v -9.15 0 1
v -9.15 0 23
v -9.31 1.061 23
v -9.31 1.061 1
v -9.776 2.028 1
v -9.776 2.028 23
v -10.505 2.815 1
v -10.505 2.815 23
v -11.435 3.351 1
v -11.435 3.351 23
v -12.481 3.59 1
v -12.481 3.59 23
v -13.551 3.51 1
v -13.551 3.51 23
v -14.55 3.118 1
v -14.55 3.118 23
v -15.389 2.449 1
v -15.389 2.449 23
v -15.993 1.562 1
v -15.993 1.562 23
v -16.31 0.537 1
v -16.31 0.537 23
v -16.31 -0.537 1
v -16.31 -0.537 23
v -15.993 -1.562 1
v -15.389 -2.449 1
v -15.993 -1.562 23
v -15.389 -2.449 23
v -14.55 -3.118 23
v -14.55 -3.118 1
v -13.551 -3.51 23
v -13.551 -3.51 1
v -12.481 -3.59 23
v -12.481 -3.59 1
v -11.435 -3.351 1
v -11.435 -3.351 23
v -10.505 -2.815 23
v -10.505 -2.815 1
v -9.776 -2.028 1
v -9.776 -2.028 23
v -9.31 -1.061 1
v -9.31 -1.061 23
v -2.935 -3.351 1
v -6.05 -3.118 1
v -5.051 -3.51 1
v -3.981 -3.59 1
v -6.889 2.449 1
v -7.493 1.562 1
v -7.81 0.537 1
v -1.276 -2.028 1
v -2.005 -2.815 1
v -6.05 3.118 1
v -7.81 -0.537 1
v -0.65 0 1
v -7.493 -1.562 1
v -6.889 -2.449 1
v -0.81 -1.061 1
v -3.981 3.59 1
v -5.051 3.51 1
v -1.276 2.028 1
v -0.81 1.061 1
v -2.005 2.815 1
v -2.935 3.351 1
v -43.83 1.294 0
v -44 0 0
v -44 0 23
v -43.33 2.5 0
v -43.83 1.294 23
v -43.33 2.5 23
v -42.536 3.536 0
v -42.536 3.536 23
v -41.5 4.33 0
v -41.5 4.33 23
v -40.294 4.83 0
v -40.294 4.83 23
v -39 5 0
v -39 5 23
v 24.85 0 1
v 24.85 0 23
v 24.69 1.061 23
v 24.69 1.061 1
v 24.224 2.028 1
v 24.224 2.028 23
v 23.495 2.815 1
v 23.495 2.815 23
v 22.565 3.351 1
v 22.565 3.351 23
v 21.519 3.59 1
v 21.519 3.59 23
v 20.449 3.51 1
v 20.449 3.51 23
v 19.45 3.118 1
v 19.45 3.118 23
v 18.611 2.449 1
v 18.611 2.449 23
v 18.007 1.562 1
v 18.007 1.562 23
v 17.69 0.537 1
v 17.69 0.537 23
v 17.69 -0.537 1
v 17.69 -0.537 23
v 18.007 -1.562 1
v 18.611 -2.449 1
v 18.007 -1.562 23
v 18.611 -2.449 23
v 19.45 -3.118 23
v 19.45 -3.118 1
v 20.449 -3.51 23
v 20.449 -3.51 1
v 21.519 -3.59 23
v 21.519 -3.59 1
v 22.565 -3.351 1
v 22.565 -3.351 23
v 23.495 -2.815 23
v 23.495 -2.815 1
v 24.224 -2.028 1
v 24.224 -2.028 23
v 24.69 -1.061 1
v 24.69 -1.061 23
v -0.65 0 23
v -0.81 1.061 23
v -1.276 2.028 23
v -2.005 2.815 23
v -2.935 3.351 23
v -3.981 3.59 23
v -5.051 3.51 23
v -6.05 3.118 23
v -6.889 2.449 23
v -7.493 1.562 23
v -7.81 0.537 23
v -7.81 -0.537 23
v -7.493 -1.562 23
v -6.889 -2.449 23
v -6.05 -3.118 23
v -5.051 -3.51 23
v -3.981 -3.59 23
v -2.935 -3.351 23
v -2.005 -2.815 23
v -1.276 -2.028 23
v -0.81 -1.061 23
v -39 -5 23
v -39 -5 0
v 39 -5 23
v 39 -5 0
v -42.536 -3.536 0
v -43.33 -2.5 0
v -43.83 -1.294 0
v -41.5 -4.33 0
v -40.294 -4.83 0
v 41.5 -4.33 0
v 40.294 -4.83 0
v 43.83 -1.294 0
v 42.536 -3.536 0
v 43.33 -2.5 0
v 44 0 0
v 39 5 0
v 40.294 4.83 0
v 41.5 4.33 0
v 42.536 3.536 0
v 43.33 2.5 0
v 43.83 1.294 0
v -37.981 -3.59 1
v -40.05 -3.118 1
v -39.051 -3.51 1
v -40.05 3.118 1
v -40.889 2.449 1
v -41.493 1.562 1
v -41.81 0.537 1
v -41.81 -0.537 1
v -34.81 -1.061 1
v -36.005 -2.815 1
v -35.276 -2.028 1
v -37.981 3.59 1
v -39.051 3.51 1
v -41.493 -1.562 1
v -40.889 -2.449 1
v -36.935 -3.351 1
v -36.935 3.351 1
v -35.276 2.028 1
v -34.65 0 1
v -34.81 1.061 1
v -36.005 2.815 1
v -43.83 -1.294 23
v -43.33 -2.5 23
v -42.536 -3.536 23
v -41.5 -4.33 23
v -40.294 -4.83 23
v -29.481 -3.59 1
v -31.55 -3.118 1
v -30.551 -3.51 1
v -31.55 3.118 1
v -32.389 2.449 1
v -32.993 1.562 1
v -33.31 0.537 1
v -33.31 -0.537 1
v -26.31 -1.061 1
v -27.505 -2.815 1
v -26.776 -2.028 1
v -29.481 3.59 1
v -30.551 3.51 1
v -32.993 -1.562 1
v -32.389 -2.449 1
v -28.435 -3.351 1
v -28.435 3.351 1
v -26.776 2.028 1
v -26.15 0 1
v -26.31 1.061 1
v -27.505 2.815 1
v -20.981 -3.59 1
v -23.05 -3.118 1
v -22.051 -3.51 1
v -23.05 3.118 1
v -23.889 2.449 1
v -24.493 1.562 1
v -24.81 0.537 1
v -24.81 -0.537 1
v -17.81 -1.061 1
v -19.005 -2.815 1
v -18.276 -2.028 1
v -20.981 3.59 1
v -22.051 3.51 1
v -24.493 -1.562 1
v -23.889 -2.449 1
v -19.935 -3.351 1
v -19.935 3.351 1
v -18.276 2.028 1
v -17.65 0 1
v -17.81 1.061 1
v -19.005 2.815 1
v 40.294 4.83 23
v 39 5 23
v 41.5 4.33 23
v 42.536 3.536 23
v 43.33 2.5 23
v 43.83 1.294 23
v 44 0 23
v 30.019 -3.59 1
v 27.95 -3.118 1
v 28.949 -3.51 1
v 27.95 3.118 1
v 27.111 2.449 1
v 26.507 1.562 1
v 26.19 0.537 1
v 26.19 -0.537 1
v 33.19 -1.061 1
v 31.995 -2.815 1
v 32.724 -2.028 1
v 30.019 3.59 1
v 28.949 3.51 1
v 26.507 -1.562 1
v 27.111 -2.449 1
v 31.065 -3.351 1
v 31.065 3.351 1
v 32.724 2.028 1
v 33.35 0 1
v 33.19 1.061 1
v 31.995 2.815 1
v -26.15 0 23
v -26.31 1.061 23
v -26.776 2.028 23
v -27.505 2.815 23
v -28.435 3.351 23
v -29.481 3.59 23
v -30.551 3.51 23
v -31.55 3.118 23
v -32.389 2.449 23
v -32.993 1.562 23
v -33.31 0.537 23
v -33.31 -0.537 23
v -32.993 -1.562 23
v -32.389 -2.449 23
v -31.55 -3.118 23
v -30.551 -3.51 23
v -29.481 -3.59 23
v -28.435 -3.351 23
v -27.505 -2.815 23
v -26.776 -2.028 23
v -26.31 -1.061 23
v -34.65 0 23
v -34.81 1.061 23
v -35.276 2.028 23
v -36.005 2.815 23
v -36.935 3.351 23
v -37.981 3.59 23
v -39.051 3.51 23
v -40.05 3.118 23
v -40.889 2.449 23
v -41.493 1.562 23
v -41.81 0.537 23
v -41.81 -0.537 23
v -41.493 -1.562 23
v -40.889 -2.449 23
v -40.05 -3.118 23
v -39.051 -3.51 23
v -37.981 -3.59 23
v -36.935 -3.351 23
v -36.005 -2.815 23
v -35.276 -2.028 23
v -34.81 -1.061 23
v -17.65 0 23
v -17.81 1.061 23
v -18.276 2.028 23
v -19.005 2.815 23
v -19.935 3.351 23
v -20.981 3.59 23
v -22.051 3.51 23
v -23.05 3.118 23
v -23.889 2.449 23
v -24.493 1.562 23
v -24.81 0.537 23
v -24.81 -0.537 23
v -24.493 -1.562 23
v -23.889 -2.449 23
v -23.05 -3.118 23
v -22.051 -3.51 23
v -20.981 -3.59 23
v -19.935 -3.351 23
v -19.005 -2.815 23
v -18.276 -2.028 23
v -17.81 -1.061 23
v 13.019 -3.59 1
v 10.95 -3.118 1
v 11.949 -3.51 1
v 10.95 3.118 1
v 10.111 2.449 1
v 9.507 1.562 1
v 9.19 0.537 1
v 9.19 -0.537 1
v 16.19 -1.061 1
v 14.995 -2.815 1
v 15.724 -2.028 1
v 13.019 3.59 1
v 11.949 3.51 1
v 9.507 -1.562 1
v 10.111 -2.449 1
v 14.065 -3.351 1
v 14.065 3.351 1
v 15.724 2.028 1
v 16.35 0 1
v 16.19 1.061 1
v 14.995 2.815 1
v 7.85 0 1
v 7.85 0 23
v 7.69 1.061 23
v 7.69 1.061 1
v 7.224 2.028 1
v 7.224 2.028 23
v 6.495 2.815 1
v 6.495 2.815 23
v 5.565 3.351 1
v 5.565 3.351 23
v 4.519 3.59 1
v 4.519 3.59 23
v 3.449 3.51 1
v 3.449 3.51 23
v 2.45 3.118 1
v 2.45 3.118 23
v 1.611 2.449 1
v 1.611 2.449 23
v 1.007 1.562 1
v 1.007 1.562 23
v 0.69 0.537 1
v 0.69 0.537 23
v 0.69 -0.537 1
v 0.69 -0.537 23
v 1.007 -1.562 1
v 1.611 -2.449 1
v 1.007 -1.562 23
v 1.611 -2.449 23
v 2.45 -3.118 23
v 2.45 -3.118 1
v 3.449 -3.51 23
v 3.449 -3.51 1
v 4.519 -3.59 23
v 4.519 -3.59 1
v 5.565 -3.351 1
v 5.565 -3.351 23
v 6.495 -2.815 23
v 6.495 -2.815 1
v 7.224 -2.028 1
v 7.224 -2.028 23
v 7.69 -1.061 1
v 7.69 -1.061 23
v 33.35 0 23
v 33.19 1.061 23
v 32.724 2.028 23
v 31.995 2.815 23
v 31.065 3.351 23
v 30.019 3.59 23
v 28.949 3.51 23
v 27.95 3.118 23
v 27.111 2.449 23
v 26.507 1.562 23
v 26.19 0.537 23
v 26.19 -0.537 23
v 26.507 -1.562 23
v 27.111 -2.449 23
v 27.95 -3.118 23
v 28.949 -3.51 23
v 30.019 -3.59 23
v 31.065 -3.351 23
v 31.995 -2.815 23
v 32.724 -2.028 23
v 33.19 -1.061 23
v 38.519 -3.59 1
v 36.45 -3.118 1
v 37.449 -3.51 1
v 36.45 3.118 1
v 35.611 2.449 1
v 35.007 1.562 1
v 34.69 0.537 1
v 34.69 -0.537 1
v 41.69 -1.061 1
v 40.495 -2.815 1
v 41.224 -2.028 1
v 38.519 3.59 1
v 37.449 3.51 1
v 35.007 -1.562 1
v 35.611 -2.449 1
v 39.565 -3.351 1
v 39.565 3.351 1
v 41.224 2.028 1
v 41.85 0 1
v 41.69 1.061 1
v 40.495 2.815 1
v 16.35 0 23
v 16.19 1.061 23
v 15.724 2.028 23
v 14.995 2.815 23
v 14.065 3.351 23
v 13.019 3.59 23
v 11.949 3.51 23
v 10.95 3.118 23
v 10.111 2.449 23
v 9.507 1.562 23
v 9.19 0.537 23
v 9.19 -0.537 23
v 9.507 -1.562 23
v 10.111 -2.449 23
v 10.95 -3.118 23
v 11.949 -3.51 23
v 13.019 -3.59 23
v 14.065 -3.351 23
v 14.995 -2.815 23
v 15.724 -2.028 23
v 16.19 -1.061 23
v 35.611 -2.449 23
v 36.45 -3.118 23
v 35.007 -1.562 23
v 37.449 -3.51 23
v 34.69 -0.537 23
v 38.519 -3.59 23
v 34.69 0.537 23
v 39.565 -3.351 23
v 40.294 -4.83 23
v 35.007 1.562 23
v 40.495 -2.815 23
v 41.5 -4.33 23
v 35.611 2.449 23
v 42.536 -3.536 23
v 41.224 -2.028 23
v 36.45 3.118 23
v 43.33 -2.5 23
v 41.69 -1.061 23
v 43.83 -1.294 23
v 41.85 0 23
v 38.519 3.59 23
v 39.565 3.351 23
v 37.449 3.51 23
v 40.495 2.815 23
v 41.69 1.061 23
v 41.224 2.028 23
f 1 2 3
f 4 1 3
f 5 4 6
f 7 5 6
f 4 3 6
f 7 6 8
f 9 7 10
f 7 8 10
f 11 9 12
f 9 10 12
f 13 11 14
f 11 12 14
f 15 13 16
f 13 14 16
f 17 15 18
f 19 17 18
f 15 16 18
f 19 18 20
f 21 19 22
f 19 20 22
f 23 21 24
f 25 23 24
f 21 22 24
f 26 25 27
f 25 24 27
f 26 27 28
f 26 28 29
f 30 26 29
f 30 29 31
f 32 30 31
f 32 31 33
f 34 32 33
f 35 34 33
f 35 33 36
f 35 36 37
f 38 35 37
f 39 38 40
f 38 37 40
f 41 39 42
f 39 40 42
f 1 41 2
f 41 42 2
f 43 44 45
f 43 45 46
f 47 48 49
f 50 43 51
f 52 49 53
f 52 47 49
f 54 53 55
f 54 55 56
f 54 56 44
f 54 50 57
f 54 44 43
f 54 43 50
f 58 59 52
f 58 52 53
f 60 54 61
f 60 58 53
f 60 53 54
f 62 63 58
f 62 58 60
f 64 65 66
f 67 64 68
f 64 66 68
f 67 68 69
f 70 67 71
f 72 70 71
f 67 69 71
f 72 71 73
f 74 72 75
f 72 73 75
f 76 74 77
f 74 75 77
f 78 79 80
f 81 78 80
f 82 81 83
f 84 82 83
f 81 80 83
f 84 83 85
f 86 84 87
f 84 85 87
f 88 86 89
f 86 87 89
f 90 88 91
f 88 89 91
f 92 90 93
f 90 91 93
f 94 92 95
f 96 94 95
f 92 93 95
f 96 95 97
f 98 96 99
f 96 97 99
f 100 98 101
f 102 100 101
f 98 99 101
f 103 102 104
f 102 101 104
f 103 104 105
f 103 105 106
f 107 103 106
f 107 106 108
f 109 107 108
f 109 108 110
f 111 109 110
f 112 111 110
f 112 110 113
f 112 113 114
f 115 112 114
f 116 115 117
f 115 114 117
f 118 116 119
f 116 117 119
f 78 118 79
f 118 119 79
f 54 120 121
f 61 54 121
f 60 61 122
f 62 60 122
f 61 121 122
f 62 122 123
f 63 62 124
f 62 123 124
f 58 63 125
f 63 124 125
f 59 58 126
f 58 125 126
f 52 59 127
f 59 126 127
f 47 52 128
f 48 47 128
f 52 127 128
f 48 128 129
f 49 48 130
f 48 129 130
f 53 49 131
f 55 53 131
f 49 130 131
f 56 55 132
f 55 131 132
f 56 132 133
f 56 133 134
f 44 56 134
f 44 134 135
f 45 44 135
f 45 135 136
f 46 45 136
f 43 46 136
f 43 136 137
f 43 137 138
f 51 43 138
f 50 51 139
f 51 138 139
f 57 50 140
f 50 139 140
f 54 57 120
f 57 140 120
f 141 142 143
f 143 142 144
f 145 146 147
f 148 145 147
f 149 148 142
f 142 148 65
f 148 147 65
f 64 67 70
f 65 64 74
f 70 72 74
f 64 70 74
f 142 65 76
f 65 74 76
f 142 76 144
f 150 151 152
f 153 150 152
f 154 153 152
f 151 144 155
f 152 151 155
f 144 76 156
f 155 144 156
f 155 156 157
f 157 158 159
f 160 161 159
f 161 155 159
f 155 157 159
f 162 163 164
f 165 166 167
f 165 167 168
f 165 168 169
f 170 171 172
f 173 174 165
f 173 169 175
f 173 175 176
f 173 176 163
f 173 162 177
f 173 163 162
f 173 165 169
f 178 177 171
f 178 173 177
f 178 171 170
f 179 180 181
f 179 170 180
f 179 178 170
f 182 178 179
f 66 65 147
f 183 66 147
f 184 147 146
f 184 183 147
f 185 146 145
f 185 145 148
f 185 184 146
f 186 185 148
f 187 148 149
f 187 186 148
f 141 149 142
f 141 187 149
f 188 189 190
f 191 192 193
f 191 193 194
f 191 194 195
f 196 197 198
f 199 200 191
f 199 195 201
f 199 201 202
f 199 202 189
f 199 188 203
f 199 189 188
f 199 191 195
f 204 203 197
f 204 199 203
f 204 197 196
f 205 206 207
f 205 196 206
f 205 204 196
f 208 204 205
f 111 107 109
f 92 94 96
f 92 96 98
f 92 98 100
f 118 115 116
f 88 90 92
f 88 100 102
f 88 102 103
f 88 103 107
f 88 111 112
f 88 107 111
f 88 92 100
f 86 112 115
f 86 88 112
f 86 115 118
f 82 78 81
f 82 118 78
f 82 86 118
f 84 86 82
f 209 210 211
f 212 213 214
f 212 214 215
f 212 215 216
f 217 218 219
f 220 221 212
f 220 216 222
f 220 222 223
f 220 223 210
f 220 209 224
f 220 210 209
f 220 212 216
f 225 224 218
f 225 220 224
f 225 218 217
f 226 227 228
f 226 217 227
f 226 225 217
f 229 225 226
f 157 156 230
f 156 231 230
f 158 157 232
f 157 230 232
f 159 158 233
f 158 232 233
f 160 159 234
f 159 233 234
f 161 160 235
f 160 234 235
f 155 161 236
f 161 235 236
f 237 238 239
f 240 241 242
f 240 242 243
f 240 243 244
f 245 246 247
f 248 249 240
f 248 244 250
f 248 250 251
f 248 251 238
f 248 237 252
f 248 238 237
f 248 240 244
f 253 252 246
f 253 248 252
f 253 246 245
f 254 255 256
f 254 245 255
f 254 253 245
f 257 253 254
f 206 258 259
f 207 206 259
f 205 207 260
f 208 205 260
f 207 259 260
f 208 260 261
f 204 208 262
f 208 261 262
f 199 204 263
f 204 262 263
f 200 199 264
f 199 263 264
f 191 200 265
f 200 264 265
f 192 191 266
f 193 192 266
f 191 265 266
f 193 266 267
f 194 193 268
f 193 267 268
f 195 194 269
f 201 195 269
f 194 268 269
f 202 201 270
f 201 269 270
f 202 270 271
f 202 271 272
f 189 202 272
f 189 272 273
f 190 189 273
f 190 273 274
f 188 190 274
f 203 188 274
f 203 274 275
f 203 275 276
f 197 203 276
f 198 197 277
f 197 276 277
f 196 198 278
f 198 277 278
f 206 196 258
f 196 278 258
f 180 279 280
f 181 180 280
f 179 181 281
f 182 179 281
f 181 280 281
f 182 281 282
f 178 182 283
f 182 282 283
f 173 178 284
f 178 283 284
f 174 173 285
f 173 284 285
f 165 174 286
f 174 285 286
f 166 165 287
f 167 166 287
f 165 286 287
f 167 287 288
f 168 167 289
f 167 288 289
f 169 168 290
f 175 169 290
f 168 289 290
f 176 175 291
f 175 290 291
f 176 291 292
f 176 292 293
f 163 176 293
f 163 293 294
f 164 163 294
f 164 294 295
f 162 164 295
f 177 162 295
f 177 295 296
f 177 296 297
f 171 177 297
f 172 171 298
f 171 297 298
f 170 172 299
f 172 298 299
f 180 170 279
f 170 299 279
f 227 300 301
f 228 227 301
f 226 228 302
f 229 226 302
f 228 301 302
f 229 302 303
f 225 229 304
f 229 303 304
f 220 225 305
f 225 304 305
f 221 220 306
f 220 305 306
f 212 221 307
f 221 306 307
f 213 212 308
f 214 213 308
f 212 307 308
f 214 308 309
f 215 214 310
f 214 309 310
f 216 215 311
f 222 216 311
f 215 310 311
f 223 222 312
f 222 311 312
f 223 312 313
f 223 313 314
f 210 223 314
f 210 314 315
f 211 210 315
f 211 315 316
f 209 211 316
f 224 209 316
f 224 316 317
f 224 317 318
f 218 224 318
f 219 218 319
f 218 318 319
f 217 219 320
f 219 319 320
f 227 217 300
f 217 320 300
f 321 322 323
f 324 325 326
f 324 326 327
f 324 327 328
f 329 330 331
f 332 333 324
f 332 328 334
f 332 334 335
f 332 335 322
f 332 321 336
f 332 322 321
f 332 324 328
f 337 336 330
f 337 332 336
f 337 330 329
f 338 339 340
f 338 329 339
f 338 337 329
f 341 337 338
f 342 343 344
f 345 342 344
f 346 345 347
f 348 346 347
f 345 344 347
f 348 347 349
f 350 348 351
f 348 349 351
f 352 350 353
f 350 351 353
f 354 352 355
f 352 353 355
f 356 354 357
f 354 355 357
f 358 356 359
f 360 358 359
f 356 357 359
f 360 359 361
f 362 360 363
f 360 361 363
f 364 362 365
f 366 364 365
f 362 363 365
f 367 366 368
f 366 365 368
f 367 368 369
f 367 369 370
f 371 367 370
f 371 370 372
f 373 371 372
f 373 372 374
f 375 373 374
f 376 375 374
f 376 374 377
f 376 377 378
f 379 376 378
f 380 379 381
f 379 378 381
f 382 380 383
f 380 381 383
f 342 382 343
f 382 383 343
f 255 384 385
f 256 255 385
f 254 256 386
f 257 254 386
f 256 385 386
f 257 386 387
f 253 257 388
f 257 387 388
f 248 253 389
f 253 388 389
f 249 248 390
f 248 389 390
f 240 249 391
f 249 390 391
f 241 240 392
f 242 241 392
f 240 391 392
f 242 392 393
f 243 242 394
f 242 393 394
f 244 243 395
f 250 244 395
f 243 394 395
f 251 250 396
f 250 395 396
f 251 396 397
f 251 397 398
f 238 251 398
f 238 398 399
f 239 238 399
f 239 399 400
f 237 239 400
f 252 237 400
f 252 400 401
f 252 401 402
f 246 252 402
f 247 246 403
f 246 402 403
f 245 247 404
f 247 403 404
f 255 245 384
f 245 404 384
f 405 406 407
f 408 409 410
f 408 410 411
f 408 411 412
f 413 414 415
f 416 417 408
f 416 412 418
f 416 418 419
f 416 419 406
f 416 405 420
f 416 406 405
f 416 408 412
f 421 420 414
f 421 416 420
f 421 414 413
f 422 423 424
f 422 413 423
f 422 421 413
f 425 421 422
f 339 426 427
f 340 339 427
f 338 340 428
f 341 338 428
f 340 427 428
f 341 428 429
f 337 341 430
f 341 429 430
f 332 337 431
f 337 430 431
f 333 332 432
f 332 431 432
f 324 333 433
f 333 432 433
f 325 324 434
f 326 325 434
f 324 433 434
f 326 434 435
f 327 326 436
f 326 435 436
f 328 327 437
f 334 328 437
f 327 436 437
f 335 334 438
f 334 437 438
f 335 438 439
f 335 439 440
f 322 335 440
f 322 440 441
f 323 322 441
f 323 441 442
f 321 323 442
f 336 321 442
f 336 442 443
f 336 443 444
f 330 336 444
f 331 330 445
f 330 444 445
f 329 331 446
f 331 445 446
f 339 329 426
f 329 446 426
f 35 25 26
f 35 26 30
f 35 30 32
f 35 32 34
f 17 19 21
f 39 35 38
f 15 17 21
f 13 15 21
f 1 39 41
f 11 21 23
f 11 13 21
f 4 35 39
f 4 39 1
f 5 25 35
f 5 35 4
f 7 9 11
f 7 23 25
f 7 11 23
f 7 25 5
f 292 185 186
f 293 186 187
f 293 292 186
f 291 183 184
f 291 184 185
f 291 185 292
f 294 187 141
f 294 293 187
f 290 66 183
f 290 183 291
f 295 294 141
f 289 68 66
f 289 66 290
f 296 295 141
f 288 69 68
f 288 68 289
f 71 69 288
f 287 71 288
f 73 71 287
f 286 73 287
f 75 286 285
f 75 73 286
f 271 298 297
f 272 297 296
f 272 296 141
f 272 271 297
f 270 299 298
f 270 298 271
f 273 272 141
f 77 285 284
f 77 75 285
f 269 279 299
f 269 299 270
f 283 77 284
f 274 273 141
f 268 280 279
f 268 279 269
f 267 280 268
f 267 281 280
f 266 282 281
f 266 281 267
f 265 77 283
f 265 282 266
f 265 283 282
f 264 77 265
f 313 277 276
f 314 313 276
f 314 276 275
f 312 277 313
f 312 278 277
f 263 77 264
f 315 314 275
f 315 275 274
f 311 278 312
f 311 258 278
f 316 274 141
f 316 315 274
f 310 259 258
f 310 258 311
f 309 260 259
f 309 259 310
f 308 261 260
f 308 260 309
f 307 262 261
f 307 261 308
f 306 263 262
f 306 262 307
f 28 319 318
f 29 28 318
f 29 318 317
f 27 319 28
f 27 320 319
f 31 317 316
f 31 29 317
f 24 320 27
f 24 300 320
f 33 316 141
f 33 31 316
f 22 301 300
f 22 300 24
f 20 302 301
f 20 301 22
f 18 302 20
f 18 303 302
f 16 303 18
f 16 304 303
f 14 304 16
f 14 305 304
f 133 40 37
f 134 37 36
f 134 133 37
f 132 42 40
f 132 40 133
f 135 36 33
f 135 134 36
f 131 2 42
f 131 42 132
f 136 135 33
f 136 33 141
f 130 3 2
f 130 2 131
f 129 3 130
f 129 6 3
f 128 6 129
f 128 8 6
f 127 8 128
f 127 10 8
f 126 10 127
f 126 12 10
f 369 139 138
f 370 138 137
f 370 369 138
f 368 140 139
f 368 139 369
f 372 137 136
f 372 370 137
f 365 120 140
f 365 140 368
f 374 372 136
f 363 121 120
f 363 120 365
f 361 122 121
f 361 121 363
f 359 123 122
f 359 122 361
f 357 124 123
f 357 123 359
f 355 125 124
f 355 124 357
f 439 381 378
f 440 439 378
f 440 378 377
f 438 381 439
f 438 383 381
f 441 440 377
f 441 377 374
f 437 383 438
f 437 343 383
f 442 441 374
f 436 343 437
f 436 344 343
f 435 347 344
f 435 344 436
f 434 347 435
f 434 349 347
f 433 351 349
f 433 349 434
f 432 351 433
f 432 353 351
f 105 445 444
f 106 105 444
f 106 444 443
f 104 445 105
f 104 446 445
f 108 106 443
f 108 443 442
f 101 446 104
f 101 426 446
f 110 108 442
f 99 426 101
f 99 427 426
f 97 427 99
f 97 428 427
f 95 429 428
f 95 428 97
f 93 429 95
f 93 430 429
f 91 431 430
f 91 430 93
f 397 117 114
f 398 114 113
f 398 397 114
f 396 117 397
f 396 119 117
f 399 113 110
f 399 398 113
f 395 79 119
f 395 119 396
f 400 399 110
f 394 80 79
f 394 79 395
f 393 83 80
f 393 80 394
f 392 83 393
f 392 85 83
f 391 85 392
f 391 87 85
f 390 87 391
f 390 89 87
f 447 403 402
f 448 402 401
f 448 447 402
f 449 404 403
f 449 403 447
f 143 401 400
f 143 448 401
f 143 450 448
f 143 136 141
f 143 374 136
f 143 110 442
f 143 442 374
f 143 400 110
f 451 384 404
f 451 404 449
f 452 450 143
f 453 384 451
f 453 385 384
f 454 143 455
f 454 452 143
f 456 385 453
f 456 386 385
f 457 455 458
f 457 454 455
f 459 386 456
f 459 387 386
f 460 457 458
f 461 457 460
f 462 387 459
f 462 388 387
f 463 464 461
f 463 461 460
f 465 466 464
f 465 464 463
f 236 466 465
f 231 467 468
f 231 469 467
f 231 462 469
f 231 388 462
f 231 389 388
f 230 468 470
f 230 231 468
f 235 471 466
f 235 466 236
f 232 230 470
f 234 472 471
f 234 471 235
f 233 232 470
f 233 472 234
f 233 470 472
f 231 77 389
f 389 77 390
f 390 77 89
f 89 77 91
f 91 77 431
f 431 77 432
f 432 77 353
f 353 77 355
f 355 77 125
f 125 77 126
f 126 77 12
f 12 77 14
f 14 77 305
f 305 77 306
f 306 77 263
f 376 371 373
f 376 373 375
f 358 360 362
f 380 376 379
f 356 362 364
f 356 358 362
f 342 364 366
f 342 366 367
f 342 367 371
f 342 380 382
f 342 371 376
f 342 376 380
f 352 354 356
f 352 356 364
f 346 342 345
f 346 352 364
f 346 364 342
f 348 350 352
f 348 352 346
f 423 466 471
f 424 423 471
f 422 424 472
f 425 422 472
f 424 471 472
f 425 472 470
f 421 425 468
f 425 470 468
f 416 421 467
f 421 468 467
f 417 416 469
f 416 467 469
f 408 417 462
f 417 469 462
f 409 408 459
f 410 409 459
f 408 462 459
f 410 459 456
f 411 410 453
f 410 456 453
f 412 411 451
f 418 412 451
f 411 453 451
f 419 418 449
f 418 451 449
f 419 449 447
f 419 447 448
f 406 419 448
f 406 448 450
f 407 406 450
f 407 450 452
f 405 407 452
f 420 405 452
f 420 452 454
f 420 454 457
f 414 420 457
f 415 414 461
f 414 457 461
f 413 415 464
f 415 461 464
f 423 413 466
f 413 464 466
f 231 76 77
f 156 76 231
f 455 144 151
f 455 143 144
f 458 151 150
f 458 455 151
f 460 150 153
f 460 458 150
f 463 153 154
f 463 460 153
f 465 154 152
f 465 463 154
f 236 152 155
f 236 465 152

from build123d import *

# Parameters (mm, degrees)
F0_W     = 88
F0_H     = 10
F1_DEPTH = 23
F2_R     = 3.6
F3_DEPTH = 22
F4_R     = 4.99999


# Not quite as in the source:
# - a fillet or chamfer is up to 0.001 mm smaller than in the source, because OpenCascade refuses the exact size


with BuildPart() as f1:
    # F0 (on Top) → F1 (new body)
    with BuildSketch(Plane.XY):
        Rectangle(F0_W, F0_H)
    extrude(amount=F1_DEPTH)

    # F2 (on face) → F3 (cut)
    with BuildSketch(Plane.XY.offset(23)):
        with Locations((-38.25, 0)):
            Circle(F2_R)
        with Locations((-29.75, 0)):
            Circle(F2_R)
        with Locations((-21.25, 0)):
            Circle(F2_R)
        with Locations((-12.75, 0)):
            Circle(F2_R)
        with Locations((-4.25, 0)):
            Circle(F2_R)
        with Locations((4.25, 0)):
            Circle(F2_R)
        with Locations((12.75, 0)):
            Circle(F2_R)
        with Locations((21.25, 0)):
            Circle(F2_R)
        with Locations((29.75, 0)):
            Circle(F2_R)
        with Locations((38.25, 0)):
            Circle(F2_R)
    extrude(amount=-F3_DEPTH, mode=Mode.SUBTRACT)

    # F4 (radius 5 in the source; OpenCascade refuses exactly that, so slightly less here)
    f4_edges = [f1.edges().sort_by_distance(p)[0] for p in [
        (44, 5, 11.5),
        (44, -5, 11.5),
        (-44, -5, 11.5),
        (-44, 5, 11.5),
    ]]
    fillet(f4_edges, radius=F4_R)


solid = f1.part
